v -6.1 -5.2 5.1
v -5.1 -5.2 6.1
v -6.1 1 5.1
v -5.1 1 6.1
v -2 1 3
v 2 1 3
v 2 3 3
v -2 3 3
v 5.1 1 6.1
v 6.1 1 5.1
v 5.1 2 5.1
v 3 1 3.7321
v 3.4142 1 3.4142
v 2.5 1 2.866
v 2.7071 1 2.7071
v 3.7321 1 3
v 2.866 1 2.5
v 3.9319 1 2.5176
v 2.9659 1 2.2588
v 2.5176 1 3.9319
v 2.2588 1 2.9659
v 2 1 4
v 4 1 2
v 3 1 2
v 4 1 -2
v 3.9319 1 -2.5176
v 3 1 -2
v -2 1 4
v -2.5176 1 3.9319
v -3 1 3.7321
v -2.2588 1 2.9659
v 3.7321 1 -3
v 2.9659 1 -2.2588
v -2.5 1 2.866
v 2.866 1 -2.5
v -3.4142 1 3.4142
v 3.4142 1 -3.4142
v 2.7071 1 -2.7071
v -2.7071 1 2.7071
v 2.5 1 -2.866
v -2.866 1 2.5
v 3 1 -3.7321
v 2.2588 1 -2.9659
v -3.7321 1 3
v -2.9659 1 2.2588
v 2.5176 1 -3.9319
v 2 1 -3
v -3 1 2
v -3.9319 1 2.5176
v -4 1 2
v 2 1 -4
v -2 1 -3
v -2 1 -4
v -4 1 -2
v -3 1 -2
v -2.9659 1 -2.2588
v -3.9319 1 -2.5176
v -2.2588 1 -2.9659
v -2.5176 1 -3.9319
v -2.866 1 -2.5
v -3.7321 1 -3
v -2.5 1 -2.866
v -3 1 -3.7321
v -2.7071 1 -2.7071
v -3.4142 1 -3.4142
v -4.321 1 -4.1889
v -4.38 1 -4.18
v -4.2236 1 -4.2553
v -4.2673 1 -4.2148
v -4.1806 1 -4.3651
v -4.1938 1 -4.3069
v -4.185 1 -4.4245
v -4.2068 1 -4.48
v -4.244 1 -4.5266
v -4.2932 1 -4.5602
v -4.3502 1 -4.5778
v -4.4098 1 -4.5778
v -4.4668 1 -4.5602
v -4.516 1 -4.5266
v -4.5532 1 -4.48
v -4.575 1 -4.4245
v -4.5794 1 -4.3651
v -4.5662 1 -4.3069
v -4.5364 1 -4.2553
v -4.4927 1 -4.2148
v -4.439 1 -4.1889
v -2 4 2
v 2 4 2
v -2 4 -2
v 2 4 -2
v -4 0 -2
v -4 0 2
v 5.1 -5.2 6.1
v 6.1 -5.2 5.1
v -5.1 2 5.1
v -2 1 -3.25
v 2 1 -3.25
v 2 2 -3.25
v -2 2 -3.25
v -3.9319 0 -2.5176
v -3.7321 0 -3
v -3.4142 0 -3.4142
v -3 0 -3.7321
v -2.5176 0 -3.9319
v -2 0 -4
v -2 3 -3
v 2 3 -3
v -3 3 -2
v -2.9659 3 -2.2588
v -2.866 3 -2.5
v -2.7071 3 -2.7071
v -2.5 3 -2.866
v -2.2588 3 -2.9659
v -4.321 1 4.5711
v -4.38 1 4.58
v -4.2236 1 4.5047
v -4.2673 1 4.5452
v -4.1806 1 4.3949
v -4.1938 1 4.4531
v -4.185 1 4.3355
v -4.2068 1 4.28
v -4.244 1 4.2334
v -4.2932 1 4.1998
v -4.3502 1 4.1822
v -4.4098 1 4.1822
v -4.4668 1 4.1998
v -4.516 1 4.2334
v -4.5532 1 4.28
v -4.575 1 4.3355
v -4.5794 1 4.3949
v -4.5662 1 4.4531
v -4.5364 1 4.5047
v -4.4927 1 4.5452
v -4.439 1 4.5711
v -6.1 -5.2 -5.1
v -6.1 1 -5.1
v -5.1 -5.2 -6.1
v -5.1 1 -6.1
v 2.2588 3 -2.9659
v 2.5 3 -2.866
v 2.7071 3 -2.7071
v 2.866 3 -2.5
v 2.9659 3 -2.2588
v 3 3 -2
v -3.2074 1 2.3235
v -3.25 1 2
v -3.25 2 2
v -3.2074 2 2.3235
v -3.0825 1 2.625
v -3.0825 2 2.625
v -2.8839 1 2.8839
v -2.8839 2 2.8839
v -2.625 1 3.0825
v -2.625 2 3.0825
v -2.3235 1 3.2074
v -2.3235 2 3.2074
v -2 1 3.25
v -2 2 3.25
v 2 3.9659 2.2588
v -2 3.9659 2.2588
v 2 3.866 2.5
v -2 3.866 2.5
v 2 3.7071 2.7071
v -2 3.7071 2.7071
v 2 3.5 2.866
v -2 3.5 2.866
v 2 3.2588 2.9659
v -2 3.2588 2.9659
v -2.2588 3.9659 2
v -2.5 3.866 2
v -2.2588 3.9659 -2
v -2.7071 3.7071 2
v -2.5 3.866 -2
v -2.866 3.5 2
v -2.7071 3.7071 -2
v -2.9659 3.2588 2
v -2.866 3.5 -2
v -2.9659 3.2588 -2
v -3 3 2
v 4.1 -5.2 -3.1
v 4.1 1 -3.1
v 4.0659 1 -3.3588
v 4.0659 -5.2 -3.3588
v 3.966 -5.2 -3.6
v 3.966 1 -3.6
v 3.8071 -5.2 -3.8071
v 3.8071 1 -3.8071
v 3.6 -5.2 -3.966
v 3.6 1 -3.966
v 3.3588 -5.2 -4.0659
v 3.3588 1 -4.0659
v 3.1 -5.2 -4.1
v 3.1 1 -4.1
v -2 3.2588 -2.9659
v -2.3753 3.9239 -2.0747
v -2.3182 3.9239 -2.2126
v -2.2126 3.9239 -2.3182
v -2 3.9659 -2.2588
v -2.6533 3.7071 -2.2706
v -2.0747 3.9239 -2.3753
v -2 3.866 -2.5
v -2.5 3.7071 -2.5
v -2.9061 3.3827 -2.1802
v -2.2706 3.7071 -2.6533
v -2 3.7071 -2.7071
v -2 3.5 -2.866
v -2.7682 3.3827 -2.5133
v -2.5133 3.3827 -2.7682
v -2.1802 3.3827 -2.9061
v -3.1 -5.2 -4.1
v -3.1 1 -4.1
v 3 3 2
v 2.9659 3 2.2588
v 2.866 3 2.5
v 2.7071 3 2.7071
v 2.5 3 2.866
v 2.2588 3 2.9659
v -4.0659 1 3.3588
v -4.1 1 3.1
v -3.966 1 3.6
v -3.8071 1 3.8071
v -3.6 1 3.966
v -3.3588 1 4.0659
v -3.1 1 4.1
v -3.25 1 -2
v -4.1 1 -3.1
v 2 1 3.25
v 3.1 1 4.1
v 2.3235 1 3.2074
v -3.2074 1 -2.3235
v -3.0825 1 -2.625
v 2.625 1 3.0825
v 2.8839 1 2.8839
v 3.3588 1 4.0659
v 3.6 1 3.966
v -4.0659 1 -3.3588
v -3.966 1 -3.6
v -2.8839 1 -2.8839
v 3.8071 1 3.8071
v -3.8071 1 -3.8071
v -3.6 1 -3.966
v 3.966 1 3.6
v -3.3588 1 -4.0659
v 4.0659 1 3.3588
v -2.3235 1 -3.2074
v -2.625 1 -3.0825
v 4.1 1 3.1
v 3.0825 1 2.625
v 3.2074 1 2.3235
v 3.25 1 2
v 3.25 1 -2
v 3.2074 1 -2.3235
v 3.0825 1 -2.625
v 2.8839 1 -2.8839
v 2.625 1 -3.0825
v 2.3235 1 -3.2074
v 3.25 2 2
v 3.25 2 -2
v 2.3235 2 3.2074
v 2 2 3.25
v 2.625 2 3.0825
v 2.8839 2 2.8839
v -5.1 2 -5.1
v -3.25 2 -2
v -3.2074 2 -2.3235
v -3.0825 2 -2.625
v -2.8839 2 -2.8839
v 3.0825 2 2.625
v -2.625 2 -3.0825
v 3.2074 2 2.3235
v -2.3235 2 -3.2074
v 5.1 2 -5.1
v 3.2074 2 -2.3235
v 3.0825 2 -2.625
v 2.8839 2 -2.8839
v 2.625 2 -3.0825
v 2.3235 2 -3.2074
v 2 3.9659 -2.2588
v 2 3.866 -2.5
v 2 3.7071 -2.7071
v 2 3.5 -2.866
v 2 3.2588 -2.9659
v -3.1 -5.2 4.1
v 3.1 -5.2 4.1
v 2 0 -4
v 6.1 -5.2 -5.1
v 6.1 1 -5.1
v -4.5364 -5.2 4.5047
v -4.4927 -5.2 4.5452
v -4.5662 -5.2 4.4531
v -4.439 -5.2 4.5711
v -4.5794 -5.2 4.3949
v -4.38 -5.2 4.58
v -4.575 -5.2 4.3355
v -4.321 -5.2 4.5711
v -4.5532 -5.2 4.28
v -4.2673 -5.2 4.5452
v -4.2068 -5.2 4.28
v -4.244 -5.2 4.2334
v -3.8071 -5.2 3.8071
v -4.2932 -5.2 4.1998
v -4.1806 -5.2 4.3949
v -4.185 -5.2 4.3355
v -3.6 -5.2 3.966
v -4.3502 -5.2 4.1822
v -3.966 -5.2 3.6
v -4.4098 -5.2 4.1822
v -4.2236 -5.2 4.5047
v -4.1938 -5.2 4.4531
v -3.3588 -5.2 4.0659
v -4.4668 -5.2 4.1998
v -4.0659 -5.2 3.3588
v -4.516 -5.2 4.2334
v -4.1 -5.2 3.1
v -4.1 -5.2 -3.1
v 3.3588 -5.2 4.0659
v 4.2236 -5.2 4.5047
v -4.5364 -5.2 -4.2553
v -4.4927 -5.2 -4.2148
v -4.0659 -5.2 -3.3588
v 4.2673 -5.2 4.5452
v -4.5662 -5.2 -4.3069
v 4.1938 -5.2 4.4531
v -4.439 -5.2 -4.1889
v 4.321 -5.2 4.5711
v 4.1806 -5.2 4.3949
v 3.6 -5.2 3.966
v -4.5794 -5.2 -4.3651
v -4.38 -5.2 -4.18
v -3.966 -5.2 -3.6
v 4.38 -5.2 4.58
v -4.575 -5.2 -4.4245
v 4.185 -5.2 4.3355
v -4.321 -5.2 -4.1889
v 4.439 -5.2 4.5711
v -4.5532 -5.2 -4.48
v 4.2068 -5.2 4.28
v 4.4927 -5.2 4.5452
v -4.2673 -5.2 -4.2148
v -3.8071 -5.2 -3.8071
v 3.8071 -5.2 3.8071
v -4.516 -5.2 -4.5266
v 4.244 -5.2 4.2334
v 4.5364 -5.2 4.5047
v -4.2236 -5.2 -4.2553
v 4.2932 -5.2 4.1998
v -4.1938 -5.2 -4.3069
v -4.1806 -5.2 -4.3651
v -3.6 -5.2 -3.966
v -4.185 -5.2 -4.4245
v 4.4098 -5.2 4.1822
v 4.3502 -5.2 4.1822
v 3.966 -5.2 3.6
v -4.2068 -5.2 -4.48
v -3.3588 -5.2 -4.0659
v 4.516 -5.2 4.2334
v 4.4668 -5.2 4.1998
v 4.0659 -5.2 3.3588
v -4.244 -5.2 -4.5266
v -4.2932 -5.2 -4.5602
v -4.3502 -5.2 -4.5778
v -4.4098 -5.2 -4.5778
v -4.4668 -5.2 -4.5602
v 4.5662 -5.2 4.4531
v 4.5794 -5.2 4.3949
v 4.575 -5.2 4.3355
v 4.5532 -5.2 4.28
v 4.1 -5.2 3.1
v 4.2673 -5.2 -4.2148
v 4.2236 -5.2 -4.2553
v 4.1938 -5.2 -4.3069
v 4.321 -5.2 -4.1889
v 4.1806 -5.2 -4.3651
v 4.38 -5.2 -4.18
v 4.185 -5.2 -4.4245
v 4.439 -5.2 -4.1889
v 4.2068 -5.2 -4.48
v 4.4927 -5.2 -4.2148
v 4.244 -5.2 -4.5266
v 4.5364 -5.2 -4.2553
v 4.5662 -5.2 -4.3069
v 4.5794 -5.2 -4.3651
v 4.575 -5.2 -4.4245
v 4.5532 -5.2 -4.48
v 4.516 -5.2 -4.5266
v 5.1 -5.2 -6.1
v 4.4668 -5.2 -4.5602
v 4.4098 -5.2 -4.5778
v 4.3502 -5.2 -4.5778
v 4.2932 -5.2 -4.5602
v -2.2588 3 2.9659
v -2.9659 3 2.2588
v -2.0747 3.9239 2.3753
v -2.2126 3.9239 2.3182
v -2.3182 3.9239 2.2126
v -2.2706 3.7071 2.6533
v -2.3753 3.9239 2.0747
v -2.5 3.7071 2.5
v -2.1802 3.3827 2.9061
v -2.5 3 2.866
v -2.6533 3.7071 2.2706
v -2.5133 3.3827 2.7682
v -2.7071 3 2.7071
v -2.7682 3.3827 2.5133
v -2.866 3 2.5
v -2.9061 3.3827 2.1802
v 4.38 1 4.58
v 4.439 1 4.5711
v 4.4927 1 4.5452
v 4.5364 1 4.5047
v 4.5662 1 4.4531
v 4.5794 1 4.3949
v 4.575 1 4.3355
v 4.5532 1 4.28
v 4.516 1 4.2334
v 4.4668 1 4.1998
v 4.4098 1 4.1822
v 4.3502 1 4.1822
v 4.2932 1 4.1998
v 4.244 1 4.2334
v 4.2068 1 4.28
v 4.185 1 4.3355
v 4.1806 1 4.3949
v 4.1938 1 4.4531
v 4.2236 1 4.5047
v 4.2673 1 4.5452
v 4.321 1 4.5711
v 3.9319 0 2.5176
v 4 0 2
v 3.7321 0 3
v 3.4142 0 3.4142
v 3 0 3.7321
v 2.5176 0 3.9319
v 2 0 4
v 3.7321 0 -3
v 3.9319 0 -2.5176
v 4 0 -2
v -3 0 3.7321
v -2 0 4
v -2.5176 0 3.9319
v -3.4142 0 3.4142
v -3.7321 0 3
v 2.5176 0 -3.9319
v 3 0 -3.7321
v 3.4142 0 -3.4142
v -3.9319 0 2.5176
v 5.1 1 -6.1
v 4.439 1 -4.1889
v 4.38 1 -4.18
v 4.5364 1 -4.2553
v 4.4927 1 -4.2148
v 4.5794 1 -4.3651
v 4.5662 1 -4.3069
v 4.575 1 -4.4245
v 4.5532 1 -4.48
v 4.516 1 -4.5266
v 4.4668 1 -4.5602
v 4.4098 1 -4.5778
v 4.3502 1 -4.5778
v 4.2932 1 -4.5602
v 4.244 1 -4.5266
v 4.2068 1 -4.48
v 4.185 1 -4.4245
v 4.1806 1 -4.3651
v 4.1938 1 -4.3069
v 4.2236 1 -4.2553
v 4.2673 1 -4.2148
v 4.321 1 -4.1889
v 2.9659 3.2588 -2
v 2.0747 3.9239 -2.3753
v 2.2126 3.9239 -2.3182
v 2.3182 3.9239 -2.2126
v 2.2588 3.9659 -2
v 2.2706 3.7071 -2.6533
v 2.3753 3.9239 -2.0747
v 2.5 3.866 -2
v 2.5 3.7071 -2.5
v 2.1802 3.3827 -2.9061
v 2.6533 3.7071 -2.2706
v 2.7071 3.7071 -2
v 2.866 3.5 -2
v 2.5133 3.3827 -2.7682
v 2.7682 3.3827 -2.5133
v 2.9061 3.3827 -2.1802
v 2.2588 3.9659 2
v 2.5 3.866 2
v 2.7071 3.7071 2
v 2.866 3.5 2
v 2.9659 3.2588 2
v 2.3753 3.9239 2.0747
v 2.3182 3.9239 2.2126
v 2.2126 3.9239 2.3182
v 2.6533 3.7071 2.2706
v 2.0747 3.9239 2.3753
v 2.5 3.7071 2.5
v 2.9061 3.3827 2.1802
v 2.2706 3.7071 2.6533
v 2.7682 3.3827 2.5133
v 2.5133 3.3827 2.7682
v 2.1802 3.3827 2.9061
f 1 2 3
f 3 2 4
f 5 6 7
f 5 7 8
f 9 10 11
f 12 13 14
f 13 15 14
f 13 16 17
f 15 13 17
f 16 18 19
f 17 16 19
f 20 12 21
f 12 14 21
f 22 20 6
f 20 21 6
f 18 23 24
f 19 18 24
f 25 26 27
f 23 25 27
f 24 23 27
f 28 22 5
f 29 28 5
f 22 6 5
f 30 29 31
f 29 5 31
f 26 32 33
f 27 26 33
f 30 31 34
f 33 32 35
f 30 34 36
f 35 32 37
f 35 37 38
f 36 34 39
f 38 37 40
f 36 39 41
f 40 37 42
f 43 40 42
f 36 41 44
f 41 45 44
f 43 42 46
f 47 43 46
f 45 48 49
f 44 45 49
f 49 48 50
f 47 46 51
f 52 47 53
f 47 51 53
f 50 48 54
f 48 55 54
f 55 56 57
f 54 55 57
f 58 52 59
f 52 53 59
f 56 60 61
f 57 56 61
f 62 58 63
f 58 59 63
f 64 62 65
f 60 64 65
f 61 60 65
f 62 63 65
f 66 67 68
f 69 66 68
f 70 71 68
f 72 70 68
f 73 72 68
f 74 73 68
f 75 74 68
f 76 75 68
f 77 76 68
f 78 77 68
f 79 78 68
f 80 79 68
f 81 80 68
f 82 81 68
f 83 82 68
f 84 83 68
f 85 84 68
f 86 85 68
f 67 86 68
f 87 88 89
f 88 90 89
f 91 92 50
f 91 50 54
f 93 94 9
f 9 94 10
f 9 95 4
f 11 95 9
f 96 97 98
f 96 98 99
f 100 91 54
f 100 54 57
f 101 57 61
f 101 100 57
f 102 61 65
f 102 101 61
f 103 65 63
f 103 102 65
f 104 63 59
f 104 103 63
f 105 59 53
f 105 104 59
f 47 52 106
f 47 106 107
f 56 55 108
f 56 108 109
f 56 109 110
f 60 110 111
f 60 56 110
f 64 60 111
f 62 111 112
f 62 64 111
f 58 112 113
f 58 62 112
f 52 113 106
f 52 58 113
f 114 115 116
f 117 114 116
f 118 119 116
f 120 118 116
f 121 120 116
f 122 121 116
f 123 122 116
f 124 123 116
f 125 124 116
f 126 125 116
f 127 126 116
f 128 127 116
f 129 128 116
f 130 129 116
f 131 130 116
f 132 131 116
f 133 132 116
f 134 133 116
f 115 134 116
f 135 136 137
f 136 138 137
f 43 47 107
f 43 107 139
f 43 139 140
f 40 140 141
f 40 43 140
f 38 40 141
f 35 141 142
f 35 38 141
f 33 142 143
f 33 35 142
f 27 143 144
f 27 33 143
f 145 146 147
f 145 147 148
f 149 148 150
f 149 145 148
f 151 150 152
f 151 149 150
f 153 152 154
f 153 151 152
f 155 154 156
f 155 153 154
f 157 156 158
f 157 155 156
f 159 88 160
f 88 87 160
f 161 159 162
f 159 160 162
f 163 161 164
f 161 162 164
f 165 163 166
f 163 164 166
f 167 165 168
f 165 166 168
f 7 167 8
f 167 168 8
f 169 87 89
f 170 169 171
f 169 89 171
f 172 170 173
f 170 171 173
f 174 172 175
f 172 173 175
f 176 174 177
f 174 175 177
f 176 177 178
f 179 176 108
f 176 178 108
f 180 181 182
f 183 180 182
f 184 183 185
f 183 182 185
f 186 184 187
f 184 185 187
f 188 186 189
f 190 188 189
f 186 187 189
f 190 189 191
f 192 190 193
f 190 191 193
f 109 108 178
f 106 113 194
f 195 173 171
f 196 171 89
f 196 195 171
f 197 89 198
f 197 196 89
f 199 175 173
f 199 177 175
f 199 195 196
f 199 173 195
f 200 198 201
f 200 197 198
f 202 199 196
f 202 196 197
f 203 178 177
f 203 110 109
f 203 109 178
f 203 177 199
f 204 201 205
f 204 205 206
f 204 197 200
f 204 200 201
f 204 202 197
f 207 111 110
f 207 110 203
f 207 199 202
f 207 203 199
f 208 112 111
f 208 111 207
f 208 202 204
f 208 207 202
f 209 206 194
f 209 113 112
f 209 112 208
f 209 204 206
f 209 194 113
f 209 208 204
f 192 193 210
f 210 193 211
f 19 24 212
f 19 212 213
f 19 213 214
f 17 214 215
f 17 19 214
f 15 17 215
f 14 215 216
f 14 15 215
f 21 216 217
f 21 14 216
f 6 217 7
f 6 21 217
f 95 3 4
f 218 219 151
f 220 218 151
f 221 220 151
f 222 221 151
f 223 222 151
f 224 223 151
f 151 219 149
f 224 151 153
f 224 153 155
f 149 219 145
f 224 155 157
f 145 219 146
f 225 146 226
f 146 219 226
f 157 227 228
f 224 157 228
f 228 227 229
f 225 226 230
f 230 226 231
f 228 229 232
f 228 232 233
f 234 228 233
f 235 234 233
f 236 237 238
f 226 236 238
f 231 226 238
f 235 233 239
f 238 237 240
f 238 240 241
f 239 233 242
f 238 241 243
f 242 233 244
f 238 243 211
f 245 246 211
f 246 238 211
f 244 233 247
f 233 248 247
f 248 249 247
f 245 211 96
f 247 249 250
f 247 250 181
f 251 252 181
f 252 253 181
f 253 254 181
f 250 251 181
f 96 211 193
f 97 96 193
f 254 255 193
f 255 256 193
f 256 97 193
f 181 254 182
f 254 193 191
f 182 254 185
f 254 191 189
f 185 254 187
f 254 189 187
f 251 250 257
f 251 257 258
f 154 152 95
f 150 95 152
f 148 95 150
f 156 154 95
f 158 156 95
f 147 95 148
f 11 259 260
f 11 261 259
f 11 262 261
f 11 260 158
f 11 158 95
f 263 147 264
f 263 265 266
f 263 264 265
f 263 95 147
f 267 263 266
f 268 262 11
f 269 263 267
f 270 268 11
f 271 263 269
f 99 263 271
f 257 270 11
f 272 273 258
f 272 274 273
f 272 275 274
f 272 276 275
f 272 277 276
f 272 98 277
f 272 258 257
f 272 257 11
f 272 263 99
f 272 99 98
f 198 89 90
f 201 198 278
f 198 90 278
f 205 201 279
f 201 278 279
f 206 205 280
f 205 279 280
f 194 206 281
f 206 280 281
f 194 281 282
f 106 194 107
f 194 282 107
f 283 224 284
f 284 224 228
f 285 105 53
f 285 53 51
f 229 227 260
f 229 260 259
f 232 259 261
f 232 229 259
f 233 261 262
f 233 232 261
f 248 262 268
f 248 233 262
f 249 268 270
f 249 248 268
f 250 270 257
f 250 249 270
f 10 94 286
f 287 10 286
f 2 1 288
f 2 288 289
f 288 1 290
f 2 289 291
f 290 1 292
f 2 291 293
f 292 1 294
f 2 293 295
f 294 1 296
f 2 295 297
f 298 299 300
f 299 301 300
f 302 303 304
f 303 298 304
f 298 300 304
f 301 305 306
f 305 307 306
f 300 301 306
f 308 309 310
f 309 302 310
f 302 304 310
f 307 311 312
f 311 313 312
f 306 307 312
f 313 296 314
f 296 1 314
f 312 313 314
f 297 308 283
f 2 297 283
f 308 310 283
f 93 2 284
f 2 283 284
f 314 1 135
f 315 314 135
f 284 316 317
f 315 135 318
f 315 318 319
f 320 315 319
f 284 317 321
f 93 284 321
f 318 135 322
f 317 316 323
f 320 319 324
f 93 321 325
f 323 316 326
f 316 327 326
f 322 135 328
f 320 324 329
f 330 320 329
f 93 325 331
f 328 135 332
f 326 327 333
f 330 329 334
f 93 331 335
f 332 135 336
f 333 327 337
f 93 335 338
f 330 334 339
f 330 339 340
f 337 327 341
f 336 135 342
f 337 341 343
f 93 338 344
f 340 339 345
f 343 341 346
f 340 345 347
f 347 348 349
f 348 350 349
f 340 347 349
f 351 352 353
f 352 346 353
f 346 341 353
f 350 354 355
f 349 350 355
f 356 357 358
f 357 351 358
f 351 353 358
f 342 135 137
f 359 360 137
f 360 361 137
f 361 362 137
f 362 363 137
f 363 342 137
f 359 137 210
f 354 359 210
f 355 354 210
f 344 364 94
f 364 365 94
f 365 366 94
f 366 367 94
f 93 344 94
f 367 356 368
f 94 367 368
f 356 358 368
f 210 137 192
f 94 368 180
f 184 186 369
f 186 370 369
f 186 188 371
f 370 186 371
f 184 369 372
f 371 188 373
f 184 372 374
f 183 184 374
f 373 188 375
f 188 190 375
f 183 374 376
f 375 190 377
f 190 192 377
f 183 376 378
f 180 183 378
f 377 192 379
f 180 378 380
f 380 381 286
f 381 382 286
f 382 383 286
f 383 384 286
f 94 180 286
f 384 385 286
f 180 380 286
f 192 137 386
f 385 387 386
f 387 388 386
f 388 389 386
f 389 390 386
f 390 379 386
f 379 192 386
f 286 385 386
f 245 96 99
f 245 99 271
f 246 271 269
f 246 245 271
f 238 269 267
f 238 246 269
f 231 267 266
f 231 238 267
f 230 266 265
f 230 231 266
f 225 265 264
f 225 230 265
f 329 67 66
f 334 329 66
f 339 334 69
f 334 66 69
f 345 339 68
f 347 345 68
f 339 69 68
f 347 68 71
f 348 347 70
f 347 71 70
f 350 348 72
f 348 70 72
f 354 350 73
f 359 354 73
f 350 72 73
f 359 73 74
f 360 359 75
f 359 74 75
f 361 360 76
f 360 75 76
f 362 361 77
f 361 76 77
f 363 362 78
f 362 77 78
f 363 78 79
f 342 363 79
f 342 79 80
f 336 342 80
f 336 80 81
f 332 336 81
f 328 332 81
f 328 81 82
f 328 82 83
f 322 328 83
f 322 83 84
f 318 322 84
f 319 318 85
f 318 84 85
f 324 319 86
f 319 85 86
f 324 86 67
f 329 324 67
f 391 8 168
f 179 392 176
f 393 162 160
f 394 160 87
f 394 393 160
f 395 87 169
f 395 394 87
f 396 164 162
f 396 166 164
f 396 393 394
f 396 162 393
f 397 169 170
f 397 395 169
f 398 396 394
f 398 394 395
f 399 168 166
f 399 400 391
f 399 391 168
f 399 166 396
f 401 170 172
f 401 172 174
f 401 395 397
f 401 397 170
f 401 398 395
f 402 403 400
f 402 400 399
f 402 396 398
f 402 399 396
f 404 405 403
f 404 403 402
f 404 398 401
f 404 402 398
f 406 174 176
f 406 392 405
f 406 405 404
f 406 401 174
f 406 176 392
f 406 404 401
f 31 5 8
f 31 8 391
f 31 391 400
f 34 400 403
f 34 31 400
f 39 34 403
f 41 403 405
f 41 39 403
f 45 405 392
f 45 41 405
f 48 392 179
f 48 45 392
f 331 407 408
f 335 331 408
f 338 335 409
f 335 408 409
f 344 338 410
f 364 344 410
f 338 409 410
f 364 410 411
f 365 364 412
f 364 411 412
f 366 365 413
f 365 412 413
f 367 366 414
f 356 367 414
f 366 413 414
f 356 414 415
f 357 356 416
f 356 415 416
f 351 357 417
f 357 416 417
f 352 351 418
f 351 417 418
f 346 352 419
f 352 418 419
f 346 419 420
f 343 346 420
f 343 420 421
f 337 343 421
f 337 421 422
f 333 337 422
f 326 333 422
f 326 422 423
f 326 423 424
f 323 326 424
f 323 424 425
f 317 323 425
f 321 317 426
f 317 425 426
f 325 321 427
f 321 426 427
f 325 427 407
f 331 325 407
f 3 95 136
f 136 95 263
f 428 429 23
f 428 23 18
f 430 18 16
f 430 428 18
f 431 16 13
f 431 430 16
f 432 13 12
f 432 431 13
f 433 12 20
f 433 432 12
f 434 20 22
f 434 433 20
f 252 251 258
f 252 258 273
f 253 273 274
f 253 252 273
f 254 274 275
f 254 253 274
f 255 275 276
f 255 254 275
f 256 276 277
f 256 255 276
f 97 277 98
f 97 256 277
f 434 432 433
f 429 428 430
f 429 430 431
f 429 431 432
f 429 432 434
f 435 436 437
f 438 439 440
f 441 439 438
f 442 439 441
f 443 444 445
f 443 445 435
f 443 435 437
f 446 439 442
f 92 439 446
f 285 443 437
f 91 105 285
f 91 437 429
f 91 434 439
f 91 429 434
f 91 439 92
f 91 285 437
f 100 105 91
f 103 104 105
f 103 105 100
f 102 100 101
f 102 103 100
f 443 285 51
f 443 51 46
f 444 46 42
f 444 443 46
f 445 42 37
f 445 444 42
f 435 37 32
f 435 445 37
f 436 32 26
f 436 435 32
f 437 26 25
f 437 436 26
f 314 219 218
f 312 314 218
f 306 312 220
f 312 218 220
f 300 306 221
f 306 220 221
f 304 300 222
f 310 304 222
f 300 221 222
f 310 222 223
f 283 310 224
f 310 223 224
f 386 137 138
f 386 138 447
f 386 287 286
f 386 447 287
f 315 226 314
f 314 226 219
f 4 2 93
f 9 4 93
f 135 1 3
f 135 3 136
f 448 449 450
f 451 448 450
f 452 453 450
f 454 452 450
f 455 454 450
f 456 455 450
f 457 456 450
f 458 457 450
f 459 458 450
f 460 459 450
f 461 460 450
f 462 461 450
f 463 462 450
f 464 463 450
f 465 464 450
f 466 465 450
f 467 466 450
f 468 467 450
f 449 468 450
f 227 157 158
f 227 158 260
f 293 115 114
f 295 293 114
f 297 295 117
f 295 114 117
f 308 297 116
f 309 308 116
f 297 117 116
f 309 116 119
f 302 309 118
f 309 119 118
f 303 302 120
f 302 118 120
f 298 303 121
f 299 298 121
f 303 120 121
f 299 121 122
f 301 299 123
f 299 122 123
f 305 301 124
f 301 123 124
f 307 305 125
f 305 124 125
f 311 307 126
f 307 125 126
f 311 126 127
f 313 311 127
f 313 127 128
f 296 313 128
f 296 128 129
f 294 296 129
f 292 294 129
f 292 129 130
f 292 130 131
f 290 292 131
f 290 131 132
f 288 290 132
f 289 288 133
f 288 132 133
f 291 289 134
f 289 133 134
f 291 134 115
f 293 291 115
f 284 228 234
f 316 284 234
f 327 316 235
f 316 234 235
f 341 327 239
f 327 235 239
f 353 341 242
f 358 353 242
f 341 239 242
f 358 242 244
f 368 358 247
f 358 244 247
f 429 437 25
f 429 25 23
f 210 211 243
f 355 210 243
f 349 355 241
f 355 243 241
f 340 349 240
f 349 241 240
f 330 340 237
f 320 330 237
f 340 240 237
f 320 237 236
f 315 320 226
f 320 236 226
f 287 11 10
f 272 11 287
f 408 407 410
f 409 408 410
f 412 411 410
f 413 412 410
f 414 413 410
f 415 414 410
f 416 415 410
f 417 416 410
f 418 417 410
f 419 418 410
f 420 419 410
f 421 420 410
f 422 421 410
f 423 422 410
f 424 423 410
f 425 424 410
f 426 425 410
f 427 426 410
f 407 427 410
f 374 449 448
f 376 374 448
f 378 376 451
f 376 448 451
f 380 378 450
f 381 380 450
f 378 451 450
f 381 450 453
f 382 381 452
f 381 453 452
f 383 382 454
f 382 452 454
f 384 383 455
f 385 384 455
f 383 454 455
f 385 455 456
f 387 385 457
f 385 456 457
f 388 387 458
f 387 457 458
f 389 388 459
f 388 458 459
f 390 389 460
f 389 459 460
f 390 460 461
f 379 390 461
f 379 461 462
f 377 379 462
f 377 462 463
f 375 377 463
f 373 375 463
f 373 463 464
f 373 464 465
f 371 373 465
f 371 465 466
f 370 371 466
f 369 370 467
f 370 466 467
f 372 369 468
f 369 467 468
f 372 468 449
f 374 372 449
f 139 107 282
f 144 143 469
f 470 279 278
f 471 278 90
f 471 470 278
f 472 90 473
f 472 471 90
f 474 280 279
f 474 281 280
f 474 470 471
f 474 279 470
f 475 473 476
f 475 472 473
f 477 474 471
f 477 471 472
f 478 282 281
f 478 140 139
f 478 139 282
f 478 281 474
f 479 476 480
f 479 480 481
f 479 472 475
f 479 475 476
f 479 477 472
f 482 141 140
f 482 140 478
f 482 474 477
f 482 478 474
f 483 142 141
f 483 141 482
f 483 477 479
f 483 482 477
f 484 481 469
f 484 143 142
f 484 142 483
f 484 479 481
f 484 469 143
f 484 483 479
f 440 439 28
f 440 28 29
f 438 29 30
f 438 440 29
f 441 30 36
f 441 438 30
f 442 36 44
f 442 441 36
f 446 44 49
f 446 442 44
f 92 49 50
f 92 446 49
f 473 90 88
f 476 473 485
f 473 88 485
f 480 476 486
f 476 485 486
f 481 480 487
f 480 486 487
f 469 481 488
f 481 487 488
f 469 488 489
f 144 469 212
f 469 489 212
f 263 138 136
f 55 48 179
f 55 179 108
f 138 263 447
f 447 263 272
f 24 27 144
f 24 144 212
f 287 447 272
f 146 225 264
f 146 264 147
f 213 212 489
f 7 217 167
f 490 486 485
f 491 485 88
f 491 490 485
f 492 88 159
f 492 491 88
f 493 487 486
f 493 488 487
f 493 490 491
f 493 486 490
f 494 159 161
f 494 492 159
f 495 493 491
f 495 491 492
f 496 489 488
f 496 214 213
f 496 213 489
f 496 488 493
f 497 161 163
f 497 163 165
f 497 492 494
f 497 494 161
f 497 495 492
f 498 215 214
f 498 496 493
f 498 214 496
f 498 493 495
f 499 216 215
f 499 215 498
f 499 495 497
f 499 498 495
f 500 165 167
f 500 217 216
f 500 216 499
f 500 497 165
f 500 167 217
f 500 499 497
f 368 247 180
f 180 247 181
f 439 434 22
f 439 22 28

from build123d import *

# Parameters (mm, degrees)
BOSS_EXTRUDE1_DEPTH = 1
BOSS_EXTRUDE2_DEPTH = 4
FILLET1_R           = 1
SKETCH2_W           = 12.2
SKETCH2_H           = 12.2
SKETCH2_R           = 0.2
BOSS_EXTRUDE3_DEPTH = 6.2
SKETCH2_3_W         = 12.2
SKETCH2_3_H         = 12.2
SKETCH2_3_R         = 0.2
BOSS_EXTRUDE4_DEPTH = 1
CHAMFER1_SIZE       = 1


with BuildPart() as part:
    # Sketch1 → Boss-Extrude1 (new body)
    with BuildSketch(Plane(origin=(0, 0, 0), x_dir=(1, 0, 0), z_dir=(0, 1, 0))):
        with BuildLine():
            Line((-4, -2), (-4, 2))
            ThreePointArc((-4, 2), (-3.414213562, 3.414213562), (-2, 4))
            Line((-2, 4), (2, 4))
            ThreePointArc((2, 4), (3.414213562, 3.414213562), (4, 2))
            Line((4, 2), (4, -2))
            ThreePointArc((4, -2), (3.414213562, -3.414213562), (2, -4))
            Line((2, -4), (-2, -4))
            ThreePointArc((-2, -4), (-3.414213562, -3.414213562), (-4, -2))
        make_face()
        with BuildLine():
            Line((-2, -3), (2, -3))
            ThreePointArc((2, -3), (2.707106781, -2.707106781), (3, -2))
            Line((3, -2), (3, 2))
            ThreePointArc((3, 2), (2.707106781, 2.707106781), (2, 3))
            Line((2, 3), (-2, 3))
            ThreePointArc((-2, 3), (-2.707106781, 2.707106781), (-3, 2))
            Line((-3, 2), (-3, -2))
            ThreePointArc((-3, -2), (-2.707106781, -2.707106781), (-2, -3))
        make_face(mode=Mode.SUBTRACT)
    extrude(amount=BOSS_EXTRUDE1_DEPTH)

    # Sketch1<2> → Boss-Extrude2 (add)
    with BuildSketch(Plane(origin=(0, 0, 0), x_dir=(1, 0, 0), z_dir=(0, 1, 0))):
        with BuildLine():
            ThreePointArc((-3, 2), (-2.707106781, 2.707106781), (-2, 3))
            Line((-2, 3), (2, 3))
            ThreePointArc((2, 3), (2.707106781, 2.707106781), (3, 2))
            Line((3, 2), (3, -2))
            ThreePointArc((3, -2), (2.707106781, -2.707106781), (2, -3))
            Line((2, -3), (-2, -3))
            ThreePointArc((-2, -3), (-2.707106781, -2.707106781), (-3, -2))
            Line((-3, -2), (-3, 2))
        make_face()
    extrude(amount=BOSS_EXTRUDE2_DEPTH)

    # Fillet1
    fillet1_edges = [part.edges().sort_by_distance(p)[0] for p in [
        (0, 4, 3),
        (2.707106781, 4, 2.707106781),
        (3, 4, 0),
        (-2.707106781, 4, -2.707106781),
        (-3, 4, 0),
        (-2.707106781, 4, 2.707106781),
        (2.707106781, 4, -2.707106781),
        (0, 4, -3),
    ]]
    fillet(fillet1_edges, radius=FILLET1_R)


with BuildPart() as body_2:
    # Sketch2 → Boss-Extrude3 (new body)
    with BuildSketch(Plane(origin=(0, 1, 0), x_dir=(1, 0, 0), z_dir=(0, 1, 0))):
        Rectangle(SKETCH2_W, SKETCH2_H)
        with Locations(Location((4.38, -4.38, 0), (0, 0, 270))):
            Circle(SKETCH2_R, mode=Mode.SUBTRACT)
        with Locations(Location((4.38, 4.38, 0), (0, 0, 270))):
            Circle(SKETCH2_R, mode=Mode.SUBTRACT)
        with Locations(Location((-4.38, 4.38, 0), (0, 0, 270))):
            Circle(SKETCH2_R, mode=Mode.SUBTRACT)
        with Locations(Location((-4.38, -4.38, 0), (0, 0, 270))):
            Circle(SKETCH2_R, mode=Mode.SUBTRACT)
        with BuildLine():
            ThreePointArc((-4.1, -3.1), (-3.807106781, -3.807106781), (-3.1, -4.1))
            Line((-3.1, -4.1), (3.1, -4.1))
            ThreePointArc((3.1, -4.1), (3.807106781, -3.807106781), (4.1, -3.1))
            Line((4.1, -3.1), (4.1, 3.1))
            ThreePointArc((4.1, 3.1), (3.807106781, 3.807106781), (3.1, 4.1))
            Line((3.1, 4.1), (-3.1, 4.1))
            ThreePointArc((-3.1, 4.1), (-3.807106781, 3.807106781), (-4.1, 3.1))
            Line((-4.1, 3.1), (-4.1, -3.1))
        make_face(mode=Mode.SUBTRACT)
    extrude(amount=-BOSS_EXTRUDE3_DEPTH)

    # Sketch2<3> → Boss-Extrude4 (add)
    # profile 1 of 7: a face of its own
    with BuildSketch(Plane(origin=(0, 1, 0), x_dir=(1, 0, 0), z_dir=(0, 1, 0))):
        Rectangle(SKETCH2_3_W, SKETCH2_3_H)
        with Locations(Location((4.38, -4.38, 0), (0, 0, 270))):
            Circle(SKETCH2_3_R, mode=Mode.SUBTRACT)
        with Locations(Location((4.38, 4.38, 0), (0, 0, 270))):
            Circle(SKETCH2_3_R, mode=Mode.SUBTRACT)
        with Locations(Location((-4.38, 4.38, 0), (0, 0, 270))):
            Circle(SKETCH2_3_R, mode=Mode.SUBTRACT)
        with Locations(Location((-4.38, -4.38, 0), (0, 0, 270))):
            Circle(SKETCH2_3_R, mode=Mode.SUBTRACT)
        with BuildLine():
            ThreePointArc((-4.1, -3.1), (-3.807106781, -3.807106781), (-3.1, -4.1))
            Line((-3.1, -4.1), (3.1, -4.1))
            ThreePointArc((3.1, -4.1), (3.807106781, -3.807106781), (4.1, -3.1))
            Line((4.1, -3.1), (4.1, 3.1))
            ThreePointArc((4.1, 3.1), (3.807106781, 3.807106781), (3.1, 4.1))
            Line((3.1, 4.1), (-3.1, 4.1))
            ThreePointArc((-3.1, 4.1), (-3.807106781, 3.807106781), (-4.1, 3.1))
            Line((-4.1, 3.1), (-4.1, -3.1))
        make_face(mode=Mode.SUBTRACT)
    # profile 2 of 7: a face of its own
    with BuildSketch(Plane(origin=(0, 1, 0), x_dir=(1, 0, 0), z_dir=(0, 1, 0))):
        with BuildLine():
            Line((-4.1, 3.1), (-4.1, -3.1))
            ThreePointArc((-4.1, -3.1), (-3.807106781, -3.807106781), (-3.1, -4.1))
            Line((-3.1, -4.1), (3.1, -4.1))
            ThreePointArc((3.1, -4.1), (3.807106781, -3.807106781), (4.1, -3.1))
            Line((4.1, -3.1), (4.1, 3.1))
            ThreePointArc((4.1, 3.1), (3.807106781, 3.807106781), (3.1, 4.1))
            Line((3.1, 4.1), (-3.1, 4.1))
            ThreePointArc((-3.1, 4.1), (-3.807106781, 3.807106781), (-4.1, 3.1))
        make_face()
        with BuildLine():
            ThreePointArc((-4, -2), (-3.414213562, -3.414213562), (-2, -4))
            Line((-2, -4), (2, -4))
            ThreePointArc((2, -4), (3.414213562, -3.414213562), (4, -2))
            Line((4, -2), (4, 2))
            ThreePointArc((4, 2), (3.414213562, 3.414213562), (2, 4))
            Line((2, 4), (-2, 4))
            ThreePointArc((-2, 4), (-3.414213562, 3.414213562), (-4, 2))
            Line((-4, 2), (-4, -2))
        make_face(mode=Mode.SUBTRACT)
    # profile 3 of 7: a face of its own
    with BuildSketch(Plane(origin=(0, 1, 0), x_dir=(1, 0, 0), z_dir=(0, 1, 0))):
        with BuildLine():
            Line((-4, 2), (-4, -2))
            ThreePointArc((-4, -2), (-3.414213562, -3.414213562), (-2, -4))
            Line((-2, -4), (2, -4))
            ThreePointArc((2, -4), (3.414213562, -3.414213562), (4, -2))
            Line((4, -2), (4, 2))
            ThreePointArc((4, 2), (3.414213562, 3.414213562), (2, 4))
            Line((2, 4), (-2, 4))
            ThreePointArc((-2, 4), (-3.414213562, 3.414213562), (-4, 2))
        make_face()
        with BuildLine():
            ThreePointArc((-3.25, -2), (-2.883883476, -2.883883476), (-2, -3.25))
            Line((-2, -3.25), (2, -3.25))
            ThreePointArc((2, -3.25), (2.883883476, -2.883883476), (3.25, -2))
            Line((3.25, -2), (3.25, 2))
            ThreePointArc((3.25, 2), (2.883883476, 2.883883476), (2, 3.25))
            Line((2, 3.25), (-2, 3.25))
            ThreePointArc((-2, 3.25), (-2.883883476, 2.883883476), (-3.25, 2))
            Line((-3.25, 2), (-3.25, -2))
        make_face(mode=Mode.SUBTRACT)
    # profile 4 of 7: a face of its own
    with BuildSketch(Plane(origin=(0, 1, 0), x_dir=(1, 0, 0), z_dir=(0, 1, 0))):
        with Locations(Location((4.38, -4.38, 0), (0, 0, 270))):
            Circle(SKETCH2_3_R)
    # profile 5 of 7: a face of its own
    with BuildSketch(Plane(origin=(0, 1, 0), x_dir=(1, 0, 0), z_dir=(0, 1, 0))):
        with Locations(Location((-4.38, -4.38, 0), (0, 0, 270))):
            Circle(SKETCH2_3_R)
    # profile 6 of 7: a face of its own
    with BuildSketch(Plane(origin=(0, 1, 0), x_dir=(1, 0, 0), z_dir=(0, 1, 0))):
        with Locations(Location((-4.38, 4.38, 0), (0, 0, 270))):
            Circle(SKETCH2_3_R)
    # profile 7 of 7: a face of its own
    with BuildSketch(Plane(origin=(0, 1, 0), x_dir=(1, 0, 0), z_dir=(0, 1, 0))):
        with Locations(Location((4.38, 4.38, 0), (0, 0, 270))):
            Circle(SKETCH2_3_R)
    extrude(amount=BOSS_EXTRUDE4_DEPTH)

    # Chamfer1
    chamfer1_edges = [body_2.edges().sort_by_distance(p)[0] for p in [
        (6.1, -1.6, -6.1),
        (6.1, -1.6, 6.1),
        (-6.1, -1.6, 6.1),
        (-6.1, -1.6, -6.1),
        (0, 2, -6.1),
        (6.1, 2, 0),
        (-6.1, 2, 0),
        (0, 2, 6.1),
    ]]
    chamfer(chamfer1_edges, length=CHAMFER1_SIZE)


solid = Compound([part.part, body_2.part])
